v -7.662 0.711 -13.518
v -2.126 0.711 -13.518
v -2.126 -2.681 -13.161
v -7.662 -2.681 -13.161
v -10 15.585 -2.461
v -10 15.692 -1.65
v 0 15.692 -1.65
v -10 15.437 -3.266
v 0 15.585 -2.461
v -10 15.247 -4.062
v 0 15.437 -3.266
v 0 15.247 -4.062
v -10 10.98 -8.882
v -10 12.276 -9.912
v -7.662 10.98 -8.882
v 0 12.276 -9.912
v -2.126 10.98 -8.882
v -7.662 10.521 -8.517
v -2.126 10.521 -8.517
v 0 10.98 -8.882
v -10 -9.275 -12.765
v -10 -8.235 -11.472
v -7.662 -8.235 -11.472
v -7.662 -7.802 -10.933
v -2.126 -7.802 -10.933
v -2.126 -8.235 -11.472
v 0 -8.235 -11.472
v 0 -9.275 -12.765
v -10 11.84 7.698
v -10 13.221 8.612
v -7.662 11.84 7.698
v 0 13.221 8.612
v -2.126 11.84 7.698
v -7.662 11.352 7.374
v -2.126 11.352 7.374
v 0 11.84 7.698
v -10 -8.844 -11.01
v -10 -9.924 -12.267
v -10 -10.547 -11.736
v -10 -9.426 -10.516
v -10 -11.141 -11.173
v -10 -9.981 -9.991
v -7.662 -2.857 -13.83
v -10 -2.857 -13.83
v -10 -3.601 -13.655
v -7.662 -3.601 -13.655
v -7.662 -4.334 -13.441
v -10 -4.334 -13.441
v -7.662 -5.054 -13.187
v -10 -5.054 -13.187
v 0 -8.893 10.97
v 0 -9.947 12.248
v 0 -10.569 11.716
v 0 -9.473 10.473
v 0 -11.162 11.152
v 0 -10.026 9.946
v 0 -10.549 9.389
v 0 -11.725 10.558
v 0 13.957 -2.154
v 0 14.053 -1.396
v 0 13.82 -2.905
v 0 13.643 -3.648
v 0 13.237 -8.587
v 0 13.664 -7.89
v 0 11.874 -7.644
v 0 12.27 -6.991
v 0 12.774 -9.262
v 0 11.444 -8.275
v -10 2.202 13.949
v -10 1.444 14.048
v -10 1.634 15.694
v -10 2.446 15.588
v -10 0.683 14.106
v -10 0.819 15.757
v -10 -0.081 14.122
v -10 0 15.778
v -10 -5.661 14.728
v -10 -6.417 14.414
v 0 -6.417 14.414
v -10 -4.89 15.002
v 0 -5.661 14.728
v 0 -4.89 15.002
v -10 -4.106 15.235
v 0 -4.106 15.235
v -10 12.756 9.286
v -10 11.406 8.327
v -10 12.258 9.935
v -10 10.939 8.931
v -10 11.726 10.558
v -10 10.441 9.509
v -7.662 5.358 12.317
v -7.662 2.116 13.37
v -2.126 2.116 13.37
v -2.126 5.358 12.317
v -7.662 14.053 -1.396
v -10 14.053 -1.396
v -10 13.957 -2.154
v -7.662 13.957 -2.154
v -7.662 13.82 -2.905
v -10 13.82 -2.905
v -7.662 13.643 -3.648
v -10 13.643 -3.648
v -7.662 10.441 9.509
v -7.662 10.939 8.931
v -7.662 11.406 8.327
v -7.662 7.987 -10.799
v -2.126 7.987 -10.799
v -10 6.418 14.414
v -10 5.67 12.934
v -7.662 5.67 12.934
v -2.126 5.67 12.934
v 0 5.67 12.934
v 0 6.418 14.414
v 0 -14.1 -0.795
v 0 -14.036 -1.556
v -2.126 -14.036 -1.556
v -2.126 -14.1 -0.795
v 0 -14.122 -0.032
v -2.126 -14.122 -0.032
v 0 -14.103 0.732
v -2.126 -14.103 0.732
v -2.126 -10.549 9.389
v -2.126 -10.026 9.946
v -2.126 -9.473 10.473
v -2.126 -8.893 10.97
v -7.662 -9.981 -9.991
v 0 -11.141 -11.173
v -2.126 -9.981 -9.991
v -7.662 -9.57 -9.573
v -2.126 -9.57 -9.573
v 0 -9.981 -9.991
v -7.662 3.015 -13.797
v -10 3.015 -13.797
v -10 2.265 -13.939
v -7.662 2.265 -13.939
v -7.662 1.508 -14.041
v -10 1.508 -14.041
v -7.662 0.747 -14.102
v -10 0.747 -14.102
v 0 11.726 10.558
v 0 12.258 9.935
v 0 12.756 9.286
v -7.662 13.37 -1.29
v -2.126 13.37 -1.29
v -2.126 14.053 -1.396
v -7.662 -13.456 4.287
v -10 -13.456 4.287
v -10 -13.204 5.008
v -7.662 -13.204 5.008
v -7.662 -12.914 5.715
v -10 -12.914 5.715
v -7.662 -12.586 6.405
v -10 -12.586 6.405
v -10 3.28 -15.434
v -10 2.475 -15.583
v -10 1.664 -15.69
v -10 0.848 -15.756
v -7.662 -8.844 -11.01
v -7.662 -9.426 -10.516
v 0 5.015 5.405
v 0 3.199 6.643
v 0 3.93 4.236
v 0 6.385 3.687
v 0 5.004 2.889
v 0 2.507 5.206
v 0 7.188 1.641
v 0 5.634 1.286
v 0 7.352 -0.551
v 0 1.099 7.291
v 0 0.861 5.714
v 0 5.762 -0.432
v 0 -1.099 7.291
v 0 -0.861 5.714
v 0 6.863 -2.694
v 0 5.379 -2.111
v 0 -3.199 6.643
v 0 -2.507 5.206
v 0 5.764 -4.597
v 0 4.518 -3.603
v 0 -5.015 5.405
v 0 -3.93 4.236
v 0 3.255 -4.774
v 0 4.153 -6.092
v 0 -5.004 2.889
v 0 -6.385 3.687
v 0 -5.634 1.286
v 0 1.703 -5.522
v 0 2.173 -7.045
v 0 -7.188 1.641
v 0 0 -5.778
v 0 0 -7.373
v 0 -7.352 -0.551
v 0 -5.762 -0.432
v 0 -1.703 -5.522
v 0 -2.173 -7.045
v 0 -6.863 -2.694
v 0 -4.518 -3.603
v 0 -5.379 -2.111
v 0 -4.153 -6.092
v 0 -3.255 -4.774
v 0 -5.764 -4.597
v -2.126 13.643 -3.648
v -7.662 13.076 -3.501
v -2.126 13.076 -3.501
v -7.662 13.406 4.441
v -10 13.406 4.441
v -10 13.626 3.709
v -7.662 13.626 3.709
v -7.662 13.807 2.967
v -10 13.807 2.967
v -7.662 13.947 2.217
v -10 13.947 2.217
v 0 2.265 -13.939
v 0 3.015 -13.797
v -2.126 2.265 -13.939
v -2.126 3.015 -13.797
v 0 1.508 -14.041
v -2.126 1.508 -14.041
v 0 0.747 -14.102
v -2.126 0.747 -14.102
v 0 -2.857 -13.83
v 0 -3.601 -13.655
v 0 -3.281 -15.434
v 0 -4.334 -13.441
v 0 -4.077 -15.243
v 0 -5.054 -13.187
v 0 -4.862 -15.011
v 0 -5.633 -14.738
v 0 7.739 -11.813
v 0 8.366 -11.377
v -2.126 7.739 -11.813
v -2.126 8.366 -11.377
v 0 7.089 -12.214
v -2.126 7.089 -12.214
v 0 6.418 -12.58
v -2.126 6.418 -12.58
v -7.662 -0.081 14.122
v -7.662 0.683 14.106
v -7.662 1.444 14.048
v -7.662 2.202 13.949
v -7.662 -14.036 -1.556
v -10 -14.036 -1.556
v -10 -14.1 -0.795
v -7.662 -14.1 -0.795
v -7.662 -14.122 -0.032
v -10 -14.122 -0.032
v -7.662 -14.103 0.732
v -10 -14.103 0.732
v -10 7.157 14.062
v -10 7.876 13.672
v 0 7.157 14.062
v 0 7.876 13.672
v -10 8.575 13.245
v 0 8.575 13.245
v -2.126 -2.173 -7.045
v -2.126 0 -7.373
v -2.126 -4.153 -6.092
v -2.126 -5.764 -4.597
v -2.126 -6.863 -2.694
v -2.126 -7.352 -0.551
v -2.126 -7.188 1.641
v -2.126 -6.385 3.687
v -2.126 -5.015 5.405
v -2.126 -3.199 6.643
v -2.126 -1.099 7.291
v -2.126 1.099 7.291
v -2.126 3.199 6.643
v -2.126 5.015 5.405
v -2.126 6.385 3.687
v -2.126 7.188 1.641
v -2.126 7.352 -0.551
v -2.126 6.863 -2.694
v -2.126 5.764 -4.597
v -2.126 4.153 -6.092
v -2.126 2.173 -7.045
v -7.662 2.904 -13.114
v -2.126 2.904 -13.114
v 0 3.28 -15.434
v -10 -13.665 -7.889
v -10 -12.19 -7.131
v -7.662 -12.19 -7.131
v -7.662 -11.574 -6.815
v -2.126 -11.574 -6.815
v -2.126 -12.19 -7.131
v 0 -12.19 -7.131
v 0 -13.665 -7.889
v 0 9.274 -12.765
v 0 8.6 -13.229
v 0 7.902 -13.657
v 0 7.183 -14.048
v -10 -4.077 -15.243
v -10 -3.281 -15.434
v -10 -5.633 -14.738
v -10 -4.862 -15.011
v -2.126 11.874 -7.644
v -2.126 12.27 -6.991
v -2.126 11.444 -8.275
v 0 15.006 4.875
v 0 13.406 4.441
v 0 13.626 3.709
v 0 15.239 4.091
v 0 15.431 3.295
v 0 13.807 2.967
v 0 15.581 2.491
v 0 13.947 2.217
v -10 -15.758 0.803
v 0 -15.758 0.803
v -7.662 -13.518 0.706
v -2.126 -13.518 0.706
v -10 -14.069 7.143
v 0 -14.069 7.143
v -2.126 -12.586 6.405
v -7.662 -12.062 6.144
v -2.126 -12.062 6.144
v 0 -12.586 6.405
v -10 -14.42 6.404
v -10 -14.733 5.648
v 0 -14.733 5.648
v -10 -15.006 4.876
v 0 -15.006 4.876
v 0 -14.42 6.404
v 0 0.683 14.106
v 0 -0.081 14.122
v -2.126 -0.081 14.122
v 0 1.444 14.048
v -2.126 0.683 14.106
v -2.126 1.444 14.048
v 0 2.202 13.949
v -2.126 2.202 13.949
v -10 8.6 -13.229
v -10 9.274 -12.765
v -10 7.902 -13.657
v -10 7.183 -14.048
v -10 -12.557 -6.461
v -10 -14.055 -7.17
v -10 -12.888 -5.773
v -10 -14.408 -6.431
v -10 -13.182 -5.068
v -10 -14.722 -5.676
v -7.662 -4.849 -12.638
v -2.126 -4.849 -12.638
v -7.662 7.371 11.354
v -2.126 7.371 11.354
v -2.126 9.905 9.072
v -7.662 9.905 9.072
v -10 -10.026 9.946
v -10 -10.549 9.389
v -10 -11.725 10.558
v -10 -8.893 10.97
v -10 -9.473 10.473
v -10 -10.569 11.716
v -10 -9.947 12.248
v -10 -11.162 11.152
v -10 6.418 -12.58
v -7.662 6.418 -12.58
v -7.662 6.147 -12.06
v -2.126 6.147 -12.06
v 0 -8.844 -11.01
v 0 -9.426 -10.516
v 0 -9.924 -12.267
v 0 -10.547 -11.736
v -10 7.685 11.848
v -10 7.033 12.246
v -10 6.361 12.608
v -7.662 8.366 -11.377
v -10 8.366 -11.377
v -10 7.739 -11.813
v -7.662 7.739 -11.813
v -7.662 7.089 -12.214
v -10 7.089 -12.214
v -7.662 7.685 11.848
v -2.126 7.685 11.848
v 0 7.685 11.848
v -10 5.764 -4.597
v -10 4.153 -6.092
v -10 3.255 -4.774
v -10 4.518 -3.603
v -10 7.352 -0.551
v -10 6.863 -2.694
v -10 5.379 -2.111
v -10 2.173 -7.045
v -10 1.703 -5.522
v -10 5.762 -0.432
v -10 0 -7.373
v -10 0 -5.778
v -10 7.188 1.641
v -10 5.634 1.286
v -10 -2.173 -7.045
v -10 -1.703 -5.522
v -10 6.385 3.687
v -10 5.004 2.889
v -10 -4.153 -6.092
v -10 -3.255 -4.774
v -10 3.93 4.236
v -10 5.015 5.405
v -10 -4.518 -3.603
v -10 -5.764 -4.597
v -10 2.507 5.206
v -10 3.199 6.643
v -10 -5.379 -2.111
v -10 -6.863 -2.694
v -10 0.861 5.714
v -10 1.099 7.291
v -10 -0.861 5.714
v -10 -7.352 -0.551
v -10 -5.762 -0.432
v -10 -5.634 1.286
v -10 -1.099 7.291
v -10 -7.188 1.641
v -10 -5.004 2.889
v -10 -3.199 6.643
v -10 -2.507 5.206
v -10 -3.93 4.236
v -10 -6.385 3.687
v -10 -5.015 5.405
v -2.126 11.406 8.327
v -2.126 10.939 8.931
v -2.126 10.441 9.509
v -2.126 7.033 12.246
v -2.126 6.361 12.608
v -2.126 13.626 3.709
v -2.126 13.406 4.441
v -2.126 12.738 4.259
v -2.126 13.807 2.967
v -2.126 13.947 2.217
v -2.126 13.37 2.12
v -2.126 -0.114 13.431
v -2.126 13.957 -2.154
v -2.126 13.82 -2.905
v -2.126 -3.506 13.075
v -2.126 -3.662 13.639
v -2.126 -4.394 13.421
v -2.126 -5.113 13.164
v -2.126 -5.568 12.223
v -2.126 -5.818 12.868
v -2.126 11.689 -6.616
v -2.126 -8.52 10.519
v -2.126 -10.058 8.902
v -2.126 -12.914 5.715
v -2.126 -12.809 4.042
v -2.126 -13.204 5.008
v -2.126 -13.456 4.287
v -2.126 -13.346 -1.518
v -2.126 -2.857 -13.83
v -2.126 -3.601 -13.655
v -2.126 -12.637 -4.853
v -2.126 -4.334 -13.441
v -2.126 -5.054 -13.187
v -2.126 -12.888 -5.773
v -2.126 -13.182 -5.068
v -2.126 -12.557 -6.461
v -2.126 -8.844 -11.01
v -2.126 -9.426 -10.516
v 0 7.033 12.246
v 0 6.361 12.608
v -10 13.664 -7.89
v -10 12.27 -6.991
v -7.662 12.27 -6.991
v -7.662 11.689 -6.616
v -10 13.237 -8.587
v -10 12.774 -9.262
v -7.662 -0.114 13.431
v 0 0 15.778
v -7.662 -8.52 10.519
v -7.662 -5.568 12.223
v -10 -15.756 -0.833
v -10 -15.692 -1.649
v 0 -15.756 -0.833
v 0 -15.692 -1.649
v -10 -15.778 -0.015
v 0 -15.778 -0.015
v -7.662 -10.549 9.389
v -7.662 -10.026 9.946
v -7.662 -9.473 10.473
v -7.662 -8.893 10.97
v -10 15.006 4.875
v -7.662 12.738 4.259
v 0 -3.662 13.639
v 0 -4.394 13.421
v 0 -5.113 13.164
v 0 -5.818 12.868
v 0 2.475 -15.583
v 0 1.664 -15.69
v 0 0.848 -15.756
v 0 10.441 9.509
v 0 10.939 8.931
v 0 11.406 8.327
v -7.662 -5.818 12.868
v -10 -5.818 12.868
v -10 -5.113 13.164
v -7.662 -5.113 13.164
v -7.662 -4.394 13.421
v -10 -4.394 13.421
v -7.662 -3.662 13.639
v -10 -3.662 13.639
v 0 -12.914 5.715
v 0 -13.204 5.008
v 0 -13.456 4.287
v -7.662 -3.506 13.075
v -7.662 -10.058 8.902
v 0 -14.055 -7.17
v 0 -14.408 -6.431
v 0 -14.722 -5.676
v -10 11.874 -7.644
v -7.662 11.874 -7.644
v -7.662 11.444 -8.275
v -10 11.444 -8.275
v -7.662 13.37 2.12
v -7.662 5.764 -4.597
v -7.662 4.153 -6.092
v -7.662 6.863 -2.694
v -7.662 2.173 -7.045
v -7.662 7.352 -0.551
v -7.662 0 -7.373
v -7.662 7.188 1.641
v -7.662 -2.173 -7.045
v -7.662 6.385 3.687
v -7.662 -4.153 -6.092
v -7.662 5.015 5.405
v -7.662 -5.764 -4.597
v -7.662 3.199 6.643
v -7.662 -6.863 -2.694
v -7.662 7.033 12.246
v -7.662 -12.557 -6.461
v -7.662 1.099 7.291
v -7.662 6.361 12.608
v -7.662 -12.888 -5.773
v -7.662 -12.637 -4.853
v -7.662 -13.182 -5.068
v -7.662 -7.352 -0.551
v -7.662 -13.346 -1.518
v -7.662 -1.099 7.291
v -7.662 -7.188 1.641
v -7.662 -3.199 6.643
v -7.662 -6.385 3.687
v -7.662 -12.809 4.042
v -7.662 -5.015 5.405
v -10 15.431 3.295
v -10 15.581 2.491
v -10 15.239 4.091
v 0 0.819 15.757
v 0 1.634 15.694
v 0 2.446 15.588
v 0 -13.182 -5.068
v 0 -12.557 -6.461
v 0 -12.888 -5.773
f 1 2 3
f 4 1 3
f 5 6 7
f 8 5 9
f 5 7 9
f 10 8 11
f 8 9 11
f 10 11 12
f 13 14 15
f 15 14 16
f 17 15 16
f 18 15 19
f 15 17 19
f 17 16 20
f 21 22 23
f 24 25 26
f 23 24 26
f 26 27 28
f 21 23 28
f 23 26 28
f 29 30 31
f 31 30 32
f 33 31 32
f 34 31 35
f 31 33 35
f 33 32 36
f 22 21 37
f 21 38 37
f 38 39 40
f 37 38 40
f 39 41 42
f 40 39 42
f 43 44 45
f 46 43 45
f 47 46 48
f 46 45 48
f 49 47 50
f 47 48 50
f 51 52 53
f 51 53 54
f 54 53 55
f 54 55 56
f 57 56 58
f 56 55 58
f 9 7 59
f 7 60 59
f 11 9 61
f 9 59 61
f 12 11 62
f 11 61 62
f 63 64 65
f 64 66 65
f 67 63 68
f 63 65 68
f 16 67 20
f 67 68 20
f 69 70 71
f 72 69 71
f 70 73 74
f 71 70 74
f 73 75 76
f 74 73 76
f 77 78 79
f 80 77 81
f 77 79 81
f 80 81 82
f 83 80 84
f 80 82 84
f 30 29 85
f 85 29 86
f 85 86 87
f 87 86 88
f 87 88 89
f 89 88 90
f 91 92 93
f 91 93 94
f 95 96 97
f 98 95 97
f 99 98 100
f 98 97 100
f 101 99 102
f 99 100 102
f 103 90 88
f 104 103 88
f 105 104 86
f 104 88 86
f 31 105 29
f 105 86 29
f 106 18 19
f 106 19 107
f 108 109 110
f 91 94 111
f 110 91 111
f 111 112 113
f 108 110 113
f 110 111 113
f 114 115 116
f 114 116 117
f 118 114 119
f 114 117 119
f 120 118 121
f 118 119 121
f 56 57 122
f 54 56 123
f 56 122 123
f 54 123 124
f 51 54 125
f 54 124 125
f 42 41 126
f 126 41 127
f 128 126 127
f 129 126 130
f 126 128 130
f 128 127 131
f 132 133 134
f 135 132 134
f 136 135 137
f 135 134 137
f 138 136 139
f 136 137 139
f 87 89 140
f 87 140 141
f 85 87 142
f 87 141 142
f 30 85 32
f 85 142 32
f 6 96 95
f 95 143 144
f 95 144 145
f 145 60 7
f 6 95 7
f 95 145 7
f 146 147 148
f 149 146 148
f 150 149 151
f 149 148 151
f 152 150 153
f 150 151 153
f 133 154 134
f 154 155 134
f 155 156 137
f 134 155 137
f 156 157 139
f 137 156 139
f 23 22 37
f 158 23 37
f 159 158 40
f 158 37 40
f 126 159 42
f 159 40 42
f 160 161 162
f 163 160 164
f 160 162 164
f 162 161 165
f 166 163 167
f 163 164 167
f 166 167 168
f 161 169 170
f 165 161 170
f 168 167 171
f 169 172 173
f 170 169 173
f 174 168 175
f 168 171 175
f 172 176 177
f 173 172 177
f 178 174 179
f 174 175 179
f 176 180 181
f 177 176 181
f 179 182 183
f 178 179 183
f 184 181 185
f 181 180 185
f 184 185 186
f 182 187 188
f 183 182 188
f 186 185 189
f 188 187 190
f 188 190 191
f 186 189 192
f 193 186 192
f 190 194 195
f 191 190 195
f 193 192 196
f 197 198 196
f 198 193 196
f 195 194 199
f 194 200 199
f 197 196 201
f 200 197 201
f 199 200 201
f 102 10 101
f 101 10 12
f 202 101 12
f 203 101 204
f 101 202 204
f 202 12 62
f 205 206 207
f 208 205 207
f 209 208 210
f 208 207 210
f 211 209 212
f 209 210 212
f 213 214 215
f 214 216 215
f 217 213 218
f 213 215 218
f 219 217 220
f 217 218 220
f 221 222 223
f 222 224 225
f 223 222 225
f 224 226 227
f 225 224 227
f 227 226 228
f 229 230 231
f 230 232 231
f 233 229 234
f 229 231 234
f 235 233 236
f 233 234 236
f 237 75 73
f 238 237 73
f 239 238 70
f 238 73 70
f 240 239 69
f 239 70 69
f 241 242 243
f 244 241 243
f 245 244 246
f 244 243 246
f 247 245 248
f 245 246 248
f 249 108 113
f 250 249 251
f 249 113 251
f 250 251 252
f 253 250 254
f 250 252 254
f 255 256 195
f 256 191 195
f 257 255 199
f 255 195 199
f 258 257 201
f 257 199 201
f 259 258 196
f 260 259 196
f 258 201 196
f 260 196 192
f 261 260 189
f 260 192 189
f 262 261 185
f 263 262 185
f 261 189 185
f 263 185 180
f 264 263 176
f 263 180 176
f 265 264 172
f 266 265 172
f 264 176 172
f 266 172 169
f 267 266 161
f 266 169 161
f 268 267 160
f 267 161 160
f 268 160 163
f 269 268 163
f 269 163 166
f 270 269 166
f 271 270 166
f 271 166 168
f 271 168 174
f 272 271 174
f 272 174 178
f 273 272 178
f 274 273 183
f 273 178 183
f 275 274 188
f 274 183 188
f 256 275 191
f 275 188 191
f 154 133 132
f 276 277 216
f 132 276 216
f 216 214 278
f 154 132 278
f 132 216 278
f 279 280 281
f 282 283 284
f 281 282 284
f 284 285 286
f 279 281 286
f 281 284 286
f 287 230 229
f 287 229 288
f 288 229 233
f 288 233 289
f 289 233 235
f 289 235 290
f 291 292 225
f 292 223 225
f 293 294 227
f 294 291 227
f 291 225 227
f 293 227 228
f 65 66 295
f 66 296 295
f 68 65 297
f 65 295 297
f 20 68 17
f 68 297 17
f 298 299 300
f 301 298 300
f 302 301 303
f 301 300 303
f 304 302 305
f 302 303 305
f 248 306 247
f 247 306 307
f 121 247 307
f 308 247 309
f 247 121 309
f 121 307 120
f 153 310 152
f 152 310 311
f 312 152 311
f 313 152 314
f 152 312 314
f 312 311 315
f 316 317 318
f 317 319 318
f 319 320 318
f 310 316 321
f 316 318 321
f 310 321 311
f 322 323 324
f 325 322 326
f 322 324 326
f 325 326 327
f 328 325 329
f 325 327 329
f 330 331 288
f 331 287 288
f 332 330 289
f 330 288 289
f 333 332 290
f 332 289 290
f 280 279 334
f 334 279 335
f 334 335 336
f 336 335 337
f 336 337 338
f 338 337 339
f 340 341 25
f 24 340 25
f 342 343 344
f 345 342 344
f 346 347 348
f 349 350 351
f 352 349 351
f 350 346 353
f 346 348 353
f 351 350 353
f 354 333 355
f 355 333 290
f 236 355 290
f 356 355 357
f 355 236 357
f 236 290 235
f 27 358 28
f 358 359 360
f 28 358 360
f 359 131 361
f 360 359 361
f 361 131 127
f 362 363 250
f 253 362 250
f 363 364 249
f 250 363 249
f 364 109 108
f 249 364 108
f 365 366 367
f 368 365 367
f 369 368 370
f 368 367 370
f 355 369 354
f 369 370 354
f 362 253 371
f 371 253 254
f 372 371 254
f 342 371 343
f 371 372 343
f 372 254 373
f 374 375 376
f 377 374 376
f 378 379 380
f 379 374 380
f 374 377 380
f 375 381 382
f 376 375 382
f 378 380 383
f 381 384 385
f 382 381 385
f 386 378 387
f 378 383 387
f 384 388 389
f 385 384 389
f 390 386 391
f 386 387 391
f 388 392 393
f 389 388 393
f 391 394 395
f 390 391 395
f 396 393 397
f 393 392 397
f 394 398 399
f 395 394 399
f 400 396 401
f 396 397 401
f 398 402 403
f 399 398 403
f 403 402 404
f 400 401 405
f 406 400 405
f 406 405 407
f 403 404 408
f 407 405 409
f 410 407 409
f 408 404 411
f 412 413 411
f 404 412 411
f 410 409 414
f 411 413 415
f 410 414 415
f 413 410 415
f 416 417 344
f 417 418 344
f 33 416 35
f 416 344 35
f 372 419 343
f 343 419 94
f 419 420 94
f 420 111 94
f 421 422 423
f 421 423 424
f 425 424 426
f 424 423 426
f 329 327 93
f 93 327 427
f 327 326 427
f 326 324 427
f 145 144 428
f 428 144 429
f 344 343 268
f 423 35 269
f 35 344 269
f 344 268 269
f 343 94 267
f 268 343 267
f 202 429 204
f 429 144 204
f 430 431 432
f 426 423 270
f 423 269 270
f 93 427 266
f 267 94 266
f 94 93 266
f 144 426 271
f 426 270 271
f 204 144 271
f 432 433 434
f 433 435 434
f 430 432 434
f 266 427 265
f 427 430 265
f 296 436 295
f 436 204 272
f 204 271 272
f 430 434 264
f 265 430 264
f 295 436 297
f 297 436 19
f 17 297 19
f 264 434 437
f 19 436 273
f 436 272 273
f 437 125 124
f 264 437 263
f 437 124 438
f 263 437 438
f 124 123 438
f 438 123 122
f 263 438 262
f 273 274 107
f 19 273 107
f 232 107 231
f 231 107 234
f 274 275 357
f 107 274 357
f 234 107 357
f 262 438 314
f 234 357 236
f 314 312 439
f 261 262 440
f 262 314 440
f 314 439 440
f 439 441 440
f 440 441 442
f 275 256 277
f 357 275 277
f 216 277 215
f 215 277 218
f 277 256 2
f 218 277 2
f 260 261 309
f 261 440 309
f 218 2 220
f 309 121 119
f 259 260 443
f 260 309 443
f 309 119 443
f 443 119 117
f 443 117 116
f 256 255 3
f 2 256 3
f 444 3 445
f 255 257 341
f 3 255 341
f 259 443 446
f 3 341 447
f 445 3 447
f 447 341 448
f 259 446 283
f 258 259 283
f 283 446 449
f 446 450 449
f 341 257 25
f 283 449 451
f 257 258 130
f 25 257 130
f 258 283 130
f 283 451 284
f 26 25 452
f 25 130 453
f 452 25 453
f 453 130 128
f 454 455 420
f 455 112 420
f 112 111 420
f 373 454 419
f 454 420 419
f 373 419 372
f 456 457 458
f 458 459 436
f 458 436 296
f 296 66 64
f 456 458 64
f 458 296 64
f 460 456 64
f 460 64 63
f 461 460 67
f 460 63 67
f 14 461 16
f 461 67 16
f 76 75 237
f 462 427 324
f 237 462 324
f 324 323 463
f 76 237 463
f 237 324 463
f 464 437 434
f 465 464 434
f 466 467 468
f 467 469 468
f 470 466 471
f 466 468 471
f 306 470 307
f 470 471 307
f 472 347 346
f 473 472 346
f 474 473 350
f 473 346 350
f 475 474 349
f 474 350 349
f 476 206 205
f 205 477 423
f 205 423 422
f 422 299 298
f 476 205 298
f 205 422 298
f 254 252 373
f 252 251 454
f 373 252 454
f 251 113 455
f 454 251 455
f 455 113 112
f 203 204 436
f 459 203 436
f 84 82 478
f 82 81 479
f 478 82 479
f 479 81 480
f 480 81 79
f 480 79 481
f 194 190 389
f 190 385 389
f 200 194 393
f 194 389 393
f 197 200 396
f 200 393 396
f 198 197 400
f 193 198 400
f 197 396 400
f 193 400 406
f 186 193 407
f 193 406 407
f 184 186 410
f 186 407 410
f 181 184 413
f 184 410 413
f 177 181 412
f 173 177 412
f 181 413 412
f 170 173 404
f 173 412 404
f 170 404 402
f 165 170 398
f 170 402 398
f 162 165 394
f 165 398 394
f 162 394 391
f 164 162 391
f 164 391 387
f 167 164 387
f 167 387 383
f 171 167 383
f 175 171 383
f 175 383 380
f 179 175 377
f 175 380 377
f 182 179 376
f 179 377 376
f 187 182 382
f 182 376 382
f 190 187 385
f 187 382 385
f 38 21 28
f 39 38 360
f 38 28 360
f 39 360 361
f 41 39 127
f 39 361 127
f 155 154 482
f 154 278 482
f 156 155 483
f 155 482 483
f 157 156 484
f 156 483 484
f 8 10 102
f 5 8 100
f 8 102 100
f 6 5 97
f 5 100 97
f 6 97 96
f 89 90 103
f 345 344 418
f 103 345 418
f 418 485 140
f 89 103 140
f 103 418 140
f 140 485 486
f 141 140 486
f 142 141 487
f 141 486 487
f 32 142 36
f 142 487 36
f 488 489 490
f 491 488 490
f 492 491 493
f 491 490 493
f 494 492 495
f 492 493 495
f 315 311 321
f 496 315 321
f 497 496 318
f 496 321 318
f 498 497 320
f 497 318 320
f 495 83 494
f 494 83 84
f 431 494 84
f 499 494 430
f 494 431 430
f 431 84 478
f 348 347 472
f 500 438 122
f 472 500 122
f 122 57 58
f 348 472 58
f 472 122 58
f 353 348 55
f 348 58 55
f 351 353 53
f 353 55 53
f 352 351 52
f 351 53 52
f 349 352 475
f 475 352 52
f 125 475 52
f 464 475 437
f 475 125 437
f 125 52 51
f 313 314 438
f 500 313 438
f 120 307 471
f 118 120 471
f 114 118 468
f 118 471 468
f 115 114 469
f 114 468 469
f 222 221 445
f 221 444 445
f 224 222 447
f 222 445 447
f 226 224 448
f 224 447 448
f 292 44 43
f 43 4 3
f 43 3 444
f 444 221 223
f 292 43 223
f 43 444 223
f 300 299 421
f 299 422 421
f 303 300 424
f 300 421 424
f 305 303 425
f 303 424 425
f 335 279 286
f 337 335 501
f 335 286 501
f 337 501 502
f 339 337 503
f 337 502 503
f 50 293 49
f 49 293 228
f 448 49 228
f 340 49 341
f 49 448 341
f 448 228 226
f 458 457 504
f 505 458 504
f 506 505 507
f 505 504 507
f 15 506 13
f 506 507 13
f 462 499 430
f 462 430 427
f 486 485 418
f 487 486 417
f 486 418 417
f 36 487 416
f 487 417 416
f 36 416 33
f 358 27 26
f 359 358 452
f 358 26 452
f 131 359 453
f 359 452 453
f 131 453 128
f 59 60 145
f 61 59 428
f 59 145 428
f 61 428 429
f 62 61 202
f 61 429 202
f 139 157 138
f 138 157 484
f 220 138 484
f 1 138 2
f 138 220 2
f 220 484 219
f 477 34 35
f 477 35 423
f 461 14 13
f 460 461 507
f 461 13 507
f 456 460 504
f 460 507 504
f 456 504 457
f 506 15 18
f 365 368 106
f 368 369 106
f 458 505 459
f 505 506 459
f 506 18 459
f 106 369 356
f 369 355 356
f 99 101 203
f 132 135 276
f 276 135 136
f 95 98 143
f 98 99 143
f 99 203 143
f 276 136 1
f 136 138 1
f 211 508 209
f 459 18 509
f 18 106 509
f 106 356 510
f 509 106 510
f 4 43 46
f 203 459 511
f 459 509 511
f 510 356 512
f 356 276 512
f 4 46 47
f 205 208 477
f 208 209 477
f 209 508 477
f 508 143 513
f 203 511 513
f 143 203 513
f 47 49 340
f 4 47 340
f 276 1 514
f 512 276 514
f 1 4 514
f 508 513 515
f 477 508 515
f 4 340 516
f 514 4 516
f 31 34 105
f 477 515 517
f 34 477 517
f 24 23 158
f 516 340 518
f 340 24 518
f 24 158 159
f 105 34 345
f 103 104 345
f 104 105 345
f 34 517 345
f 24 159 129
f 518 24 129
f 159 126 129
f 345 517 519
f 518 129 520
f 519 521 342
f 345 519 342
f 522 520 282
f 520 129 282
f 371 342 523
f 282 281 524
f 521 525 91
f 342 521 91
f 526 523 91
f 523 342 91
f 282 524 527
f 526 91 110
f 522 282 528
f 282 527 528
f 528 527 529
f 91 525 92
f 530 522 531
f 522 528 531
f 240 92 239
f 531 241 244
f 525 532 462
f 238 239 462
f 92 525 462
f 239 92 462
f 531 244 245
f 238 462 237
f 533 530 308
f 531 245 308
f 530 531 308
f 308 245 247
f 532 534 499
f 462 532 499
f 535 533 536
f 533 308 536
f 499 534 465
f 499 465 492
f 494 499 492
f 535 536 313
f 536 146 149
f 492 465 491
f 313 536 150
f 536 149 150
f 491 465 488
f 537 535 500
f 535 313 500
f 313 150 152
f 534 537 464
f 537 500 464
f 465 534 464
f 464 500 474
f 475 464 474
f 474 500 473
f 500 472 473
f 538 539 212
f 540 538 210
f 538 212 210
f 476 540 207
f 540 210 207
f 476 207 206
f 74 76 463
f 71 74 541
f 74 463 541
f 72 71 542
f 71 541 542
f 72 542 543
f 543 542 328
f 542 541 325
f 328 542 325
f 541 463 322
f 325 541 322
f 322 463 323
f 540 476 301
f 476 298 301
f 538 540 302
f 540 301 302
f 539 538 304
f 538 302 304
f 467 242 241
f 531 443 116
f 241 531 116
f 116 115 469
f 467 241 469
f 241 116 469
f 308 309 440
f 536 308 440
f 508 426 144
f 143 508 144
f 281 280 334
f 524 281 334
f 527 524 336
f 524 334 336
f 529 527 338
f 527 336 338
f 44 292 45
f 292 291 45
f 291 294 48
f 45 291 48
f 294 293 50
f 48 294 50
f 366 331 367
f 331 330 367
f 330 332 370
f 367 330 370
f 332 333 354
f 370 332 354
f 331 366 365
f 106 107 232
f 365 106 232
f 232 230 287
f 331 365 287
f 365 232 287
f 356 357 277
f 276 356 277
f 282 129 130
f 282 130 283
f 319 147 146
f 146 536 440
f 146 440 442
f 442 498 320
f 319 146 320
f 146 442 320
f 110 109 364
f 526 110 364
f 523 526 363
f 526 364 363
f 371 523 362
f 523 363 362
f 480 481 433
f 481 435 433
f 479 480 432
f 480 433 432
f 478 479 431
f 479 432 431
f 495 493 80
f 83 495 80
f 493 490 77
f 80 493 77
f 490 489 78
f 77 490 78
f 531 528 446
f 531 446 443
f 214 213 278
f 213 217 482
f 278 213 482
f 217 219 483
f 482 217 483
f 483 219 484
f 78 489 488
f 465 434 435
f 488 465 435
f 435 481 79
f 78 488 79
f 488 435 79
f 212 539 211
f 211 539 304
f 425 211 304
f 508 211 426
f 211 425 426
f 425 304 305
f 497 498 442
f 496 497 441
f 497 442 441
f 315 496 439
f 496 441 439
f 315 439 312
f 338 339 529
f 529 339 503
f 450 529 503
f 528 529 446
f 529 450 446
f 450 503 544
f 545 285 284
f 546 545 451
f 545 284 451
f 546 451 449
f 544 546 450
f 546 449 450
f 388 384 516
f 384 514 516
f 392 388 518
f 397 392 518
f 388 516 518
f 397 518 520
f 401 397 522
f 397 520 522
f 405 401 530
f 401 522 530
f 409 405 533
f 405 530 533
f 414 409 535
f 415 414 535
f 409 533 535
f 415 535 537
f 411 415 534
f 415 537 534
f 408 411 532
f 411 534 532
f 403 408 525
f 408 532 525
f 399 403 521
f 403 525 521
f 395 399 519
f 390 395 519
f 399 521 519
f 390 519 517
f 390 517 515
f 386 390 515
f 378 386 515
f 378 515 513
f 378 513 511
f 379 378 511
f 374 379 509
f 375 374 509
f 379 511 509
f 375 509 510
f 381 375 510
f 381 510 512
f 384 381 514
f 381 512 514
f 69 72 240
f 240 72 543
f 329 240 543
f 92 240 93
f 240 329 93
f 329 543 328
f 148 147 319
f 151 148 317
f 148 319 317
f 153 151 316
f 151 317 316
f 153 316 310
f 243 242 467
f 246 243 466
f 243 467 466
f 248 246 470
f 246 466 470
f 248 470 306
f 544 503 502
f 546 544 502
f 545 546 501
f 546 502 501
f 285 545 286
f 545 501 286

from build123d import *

# Parameters (mm, degrees)
CUT_EXTRUDE3_DEPTH = 16
CIRPATTERN1_COUNT  = 15


with BuildPart() as part:
    # Sketch1 → Revolve1 (revolve)
    with BuildSketch(Plane.XY, mode=Mode.PRIVATE) as revolve1_sk:
        Polygon((0, 5.778414329), (-10, 5.778414329), (-10, 7.373034886), (-7.662379617, 7.373034886), (-7.662379617, 14.122184027), (-10, 14.122184027), (-10, 15.778414329), (0, 15.778414329), (0, 14.122184027), (-2.126486554, 14.122184027), (-2.126486554, 7.373034886), (0, 7.373034886), align=None)
    revolve(revolve1_sk.sketch.rotate(Axis((0, 0, 0), (-1, 0, 0)), 90), axis=Axis((0, 0, 0), (-1, 0, 0)))

    # Sketch2 → Cut-Extrude3 (cut)
    with BuildSketch(Plane(origin=(0, 0, 0), x_dir=(0, 0, -1), z_dir=(1, 0, 0))):
        Polygon((-2.776343501, 17.284448499), (-2.119655167, 13.369575739), (1.290072721, 13.369575739), (1.896246568, 17.284448499), align=None)
    cut_extrude3 = extrude(amount=-CUT_EXTRUDE3_DEPTH, mode=Mode.SUBTRACT)

    # CirPattern1: Cut-Extrude3 ×15 about axis
    cirpattern1_axis = Axis((0, 0, 0), (1, 0, 0))
    for i in range(1, CIRPATTERN1_COUNT):
        add(cut_extrude3.rotate(cirpattern1_axis, i * 360 / CIRPATTERN1_COUNT), mode=Mode.SUBTRACT)


solid = part.part
